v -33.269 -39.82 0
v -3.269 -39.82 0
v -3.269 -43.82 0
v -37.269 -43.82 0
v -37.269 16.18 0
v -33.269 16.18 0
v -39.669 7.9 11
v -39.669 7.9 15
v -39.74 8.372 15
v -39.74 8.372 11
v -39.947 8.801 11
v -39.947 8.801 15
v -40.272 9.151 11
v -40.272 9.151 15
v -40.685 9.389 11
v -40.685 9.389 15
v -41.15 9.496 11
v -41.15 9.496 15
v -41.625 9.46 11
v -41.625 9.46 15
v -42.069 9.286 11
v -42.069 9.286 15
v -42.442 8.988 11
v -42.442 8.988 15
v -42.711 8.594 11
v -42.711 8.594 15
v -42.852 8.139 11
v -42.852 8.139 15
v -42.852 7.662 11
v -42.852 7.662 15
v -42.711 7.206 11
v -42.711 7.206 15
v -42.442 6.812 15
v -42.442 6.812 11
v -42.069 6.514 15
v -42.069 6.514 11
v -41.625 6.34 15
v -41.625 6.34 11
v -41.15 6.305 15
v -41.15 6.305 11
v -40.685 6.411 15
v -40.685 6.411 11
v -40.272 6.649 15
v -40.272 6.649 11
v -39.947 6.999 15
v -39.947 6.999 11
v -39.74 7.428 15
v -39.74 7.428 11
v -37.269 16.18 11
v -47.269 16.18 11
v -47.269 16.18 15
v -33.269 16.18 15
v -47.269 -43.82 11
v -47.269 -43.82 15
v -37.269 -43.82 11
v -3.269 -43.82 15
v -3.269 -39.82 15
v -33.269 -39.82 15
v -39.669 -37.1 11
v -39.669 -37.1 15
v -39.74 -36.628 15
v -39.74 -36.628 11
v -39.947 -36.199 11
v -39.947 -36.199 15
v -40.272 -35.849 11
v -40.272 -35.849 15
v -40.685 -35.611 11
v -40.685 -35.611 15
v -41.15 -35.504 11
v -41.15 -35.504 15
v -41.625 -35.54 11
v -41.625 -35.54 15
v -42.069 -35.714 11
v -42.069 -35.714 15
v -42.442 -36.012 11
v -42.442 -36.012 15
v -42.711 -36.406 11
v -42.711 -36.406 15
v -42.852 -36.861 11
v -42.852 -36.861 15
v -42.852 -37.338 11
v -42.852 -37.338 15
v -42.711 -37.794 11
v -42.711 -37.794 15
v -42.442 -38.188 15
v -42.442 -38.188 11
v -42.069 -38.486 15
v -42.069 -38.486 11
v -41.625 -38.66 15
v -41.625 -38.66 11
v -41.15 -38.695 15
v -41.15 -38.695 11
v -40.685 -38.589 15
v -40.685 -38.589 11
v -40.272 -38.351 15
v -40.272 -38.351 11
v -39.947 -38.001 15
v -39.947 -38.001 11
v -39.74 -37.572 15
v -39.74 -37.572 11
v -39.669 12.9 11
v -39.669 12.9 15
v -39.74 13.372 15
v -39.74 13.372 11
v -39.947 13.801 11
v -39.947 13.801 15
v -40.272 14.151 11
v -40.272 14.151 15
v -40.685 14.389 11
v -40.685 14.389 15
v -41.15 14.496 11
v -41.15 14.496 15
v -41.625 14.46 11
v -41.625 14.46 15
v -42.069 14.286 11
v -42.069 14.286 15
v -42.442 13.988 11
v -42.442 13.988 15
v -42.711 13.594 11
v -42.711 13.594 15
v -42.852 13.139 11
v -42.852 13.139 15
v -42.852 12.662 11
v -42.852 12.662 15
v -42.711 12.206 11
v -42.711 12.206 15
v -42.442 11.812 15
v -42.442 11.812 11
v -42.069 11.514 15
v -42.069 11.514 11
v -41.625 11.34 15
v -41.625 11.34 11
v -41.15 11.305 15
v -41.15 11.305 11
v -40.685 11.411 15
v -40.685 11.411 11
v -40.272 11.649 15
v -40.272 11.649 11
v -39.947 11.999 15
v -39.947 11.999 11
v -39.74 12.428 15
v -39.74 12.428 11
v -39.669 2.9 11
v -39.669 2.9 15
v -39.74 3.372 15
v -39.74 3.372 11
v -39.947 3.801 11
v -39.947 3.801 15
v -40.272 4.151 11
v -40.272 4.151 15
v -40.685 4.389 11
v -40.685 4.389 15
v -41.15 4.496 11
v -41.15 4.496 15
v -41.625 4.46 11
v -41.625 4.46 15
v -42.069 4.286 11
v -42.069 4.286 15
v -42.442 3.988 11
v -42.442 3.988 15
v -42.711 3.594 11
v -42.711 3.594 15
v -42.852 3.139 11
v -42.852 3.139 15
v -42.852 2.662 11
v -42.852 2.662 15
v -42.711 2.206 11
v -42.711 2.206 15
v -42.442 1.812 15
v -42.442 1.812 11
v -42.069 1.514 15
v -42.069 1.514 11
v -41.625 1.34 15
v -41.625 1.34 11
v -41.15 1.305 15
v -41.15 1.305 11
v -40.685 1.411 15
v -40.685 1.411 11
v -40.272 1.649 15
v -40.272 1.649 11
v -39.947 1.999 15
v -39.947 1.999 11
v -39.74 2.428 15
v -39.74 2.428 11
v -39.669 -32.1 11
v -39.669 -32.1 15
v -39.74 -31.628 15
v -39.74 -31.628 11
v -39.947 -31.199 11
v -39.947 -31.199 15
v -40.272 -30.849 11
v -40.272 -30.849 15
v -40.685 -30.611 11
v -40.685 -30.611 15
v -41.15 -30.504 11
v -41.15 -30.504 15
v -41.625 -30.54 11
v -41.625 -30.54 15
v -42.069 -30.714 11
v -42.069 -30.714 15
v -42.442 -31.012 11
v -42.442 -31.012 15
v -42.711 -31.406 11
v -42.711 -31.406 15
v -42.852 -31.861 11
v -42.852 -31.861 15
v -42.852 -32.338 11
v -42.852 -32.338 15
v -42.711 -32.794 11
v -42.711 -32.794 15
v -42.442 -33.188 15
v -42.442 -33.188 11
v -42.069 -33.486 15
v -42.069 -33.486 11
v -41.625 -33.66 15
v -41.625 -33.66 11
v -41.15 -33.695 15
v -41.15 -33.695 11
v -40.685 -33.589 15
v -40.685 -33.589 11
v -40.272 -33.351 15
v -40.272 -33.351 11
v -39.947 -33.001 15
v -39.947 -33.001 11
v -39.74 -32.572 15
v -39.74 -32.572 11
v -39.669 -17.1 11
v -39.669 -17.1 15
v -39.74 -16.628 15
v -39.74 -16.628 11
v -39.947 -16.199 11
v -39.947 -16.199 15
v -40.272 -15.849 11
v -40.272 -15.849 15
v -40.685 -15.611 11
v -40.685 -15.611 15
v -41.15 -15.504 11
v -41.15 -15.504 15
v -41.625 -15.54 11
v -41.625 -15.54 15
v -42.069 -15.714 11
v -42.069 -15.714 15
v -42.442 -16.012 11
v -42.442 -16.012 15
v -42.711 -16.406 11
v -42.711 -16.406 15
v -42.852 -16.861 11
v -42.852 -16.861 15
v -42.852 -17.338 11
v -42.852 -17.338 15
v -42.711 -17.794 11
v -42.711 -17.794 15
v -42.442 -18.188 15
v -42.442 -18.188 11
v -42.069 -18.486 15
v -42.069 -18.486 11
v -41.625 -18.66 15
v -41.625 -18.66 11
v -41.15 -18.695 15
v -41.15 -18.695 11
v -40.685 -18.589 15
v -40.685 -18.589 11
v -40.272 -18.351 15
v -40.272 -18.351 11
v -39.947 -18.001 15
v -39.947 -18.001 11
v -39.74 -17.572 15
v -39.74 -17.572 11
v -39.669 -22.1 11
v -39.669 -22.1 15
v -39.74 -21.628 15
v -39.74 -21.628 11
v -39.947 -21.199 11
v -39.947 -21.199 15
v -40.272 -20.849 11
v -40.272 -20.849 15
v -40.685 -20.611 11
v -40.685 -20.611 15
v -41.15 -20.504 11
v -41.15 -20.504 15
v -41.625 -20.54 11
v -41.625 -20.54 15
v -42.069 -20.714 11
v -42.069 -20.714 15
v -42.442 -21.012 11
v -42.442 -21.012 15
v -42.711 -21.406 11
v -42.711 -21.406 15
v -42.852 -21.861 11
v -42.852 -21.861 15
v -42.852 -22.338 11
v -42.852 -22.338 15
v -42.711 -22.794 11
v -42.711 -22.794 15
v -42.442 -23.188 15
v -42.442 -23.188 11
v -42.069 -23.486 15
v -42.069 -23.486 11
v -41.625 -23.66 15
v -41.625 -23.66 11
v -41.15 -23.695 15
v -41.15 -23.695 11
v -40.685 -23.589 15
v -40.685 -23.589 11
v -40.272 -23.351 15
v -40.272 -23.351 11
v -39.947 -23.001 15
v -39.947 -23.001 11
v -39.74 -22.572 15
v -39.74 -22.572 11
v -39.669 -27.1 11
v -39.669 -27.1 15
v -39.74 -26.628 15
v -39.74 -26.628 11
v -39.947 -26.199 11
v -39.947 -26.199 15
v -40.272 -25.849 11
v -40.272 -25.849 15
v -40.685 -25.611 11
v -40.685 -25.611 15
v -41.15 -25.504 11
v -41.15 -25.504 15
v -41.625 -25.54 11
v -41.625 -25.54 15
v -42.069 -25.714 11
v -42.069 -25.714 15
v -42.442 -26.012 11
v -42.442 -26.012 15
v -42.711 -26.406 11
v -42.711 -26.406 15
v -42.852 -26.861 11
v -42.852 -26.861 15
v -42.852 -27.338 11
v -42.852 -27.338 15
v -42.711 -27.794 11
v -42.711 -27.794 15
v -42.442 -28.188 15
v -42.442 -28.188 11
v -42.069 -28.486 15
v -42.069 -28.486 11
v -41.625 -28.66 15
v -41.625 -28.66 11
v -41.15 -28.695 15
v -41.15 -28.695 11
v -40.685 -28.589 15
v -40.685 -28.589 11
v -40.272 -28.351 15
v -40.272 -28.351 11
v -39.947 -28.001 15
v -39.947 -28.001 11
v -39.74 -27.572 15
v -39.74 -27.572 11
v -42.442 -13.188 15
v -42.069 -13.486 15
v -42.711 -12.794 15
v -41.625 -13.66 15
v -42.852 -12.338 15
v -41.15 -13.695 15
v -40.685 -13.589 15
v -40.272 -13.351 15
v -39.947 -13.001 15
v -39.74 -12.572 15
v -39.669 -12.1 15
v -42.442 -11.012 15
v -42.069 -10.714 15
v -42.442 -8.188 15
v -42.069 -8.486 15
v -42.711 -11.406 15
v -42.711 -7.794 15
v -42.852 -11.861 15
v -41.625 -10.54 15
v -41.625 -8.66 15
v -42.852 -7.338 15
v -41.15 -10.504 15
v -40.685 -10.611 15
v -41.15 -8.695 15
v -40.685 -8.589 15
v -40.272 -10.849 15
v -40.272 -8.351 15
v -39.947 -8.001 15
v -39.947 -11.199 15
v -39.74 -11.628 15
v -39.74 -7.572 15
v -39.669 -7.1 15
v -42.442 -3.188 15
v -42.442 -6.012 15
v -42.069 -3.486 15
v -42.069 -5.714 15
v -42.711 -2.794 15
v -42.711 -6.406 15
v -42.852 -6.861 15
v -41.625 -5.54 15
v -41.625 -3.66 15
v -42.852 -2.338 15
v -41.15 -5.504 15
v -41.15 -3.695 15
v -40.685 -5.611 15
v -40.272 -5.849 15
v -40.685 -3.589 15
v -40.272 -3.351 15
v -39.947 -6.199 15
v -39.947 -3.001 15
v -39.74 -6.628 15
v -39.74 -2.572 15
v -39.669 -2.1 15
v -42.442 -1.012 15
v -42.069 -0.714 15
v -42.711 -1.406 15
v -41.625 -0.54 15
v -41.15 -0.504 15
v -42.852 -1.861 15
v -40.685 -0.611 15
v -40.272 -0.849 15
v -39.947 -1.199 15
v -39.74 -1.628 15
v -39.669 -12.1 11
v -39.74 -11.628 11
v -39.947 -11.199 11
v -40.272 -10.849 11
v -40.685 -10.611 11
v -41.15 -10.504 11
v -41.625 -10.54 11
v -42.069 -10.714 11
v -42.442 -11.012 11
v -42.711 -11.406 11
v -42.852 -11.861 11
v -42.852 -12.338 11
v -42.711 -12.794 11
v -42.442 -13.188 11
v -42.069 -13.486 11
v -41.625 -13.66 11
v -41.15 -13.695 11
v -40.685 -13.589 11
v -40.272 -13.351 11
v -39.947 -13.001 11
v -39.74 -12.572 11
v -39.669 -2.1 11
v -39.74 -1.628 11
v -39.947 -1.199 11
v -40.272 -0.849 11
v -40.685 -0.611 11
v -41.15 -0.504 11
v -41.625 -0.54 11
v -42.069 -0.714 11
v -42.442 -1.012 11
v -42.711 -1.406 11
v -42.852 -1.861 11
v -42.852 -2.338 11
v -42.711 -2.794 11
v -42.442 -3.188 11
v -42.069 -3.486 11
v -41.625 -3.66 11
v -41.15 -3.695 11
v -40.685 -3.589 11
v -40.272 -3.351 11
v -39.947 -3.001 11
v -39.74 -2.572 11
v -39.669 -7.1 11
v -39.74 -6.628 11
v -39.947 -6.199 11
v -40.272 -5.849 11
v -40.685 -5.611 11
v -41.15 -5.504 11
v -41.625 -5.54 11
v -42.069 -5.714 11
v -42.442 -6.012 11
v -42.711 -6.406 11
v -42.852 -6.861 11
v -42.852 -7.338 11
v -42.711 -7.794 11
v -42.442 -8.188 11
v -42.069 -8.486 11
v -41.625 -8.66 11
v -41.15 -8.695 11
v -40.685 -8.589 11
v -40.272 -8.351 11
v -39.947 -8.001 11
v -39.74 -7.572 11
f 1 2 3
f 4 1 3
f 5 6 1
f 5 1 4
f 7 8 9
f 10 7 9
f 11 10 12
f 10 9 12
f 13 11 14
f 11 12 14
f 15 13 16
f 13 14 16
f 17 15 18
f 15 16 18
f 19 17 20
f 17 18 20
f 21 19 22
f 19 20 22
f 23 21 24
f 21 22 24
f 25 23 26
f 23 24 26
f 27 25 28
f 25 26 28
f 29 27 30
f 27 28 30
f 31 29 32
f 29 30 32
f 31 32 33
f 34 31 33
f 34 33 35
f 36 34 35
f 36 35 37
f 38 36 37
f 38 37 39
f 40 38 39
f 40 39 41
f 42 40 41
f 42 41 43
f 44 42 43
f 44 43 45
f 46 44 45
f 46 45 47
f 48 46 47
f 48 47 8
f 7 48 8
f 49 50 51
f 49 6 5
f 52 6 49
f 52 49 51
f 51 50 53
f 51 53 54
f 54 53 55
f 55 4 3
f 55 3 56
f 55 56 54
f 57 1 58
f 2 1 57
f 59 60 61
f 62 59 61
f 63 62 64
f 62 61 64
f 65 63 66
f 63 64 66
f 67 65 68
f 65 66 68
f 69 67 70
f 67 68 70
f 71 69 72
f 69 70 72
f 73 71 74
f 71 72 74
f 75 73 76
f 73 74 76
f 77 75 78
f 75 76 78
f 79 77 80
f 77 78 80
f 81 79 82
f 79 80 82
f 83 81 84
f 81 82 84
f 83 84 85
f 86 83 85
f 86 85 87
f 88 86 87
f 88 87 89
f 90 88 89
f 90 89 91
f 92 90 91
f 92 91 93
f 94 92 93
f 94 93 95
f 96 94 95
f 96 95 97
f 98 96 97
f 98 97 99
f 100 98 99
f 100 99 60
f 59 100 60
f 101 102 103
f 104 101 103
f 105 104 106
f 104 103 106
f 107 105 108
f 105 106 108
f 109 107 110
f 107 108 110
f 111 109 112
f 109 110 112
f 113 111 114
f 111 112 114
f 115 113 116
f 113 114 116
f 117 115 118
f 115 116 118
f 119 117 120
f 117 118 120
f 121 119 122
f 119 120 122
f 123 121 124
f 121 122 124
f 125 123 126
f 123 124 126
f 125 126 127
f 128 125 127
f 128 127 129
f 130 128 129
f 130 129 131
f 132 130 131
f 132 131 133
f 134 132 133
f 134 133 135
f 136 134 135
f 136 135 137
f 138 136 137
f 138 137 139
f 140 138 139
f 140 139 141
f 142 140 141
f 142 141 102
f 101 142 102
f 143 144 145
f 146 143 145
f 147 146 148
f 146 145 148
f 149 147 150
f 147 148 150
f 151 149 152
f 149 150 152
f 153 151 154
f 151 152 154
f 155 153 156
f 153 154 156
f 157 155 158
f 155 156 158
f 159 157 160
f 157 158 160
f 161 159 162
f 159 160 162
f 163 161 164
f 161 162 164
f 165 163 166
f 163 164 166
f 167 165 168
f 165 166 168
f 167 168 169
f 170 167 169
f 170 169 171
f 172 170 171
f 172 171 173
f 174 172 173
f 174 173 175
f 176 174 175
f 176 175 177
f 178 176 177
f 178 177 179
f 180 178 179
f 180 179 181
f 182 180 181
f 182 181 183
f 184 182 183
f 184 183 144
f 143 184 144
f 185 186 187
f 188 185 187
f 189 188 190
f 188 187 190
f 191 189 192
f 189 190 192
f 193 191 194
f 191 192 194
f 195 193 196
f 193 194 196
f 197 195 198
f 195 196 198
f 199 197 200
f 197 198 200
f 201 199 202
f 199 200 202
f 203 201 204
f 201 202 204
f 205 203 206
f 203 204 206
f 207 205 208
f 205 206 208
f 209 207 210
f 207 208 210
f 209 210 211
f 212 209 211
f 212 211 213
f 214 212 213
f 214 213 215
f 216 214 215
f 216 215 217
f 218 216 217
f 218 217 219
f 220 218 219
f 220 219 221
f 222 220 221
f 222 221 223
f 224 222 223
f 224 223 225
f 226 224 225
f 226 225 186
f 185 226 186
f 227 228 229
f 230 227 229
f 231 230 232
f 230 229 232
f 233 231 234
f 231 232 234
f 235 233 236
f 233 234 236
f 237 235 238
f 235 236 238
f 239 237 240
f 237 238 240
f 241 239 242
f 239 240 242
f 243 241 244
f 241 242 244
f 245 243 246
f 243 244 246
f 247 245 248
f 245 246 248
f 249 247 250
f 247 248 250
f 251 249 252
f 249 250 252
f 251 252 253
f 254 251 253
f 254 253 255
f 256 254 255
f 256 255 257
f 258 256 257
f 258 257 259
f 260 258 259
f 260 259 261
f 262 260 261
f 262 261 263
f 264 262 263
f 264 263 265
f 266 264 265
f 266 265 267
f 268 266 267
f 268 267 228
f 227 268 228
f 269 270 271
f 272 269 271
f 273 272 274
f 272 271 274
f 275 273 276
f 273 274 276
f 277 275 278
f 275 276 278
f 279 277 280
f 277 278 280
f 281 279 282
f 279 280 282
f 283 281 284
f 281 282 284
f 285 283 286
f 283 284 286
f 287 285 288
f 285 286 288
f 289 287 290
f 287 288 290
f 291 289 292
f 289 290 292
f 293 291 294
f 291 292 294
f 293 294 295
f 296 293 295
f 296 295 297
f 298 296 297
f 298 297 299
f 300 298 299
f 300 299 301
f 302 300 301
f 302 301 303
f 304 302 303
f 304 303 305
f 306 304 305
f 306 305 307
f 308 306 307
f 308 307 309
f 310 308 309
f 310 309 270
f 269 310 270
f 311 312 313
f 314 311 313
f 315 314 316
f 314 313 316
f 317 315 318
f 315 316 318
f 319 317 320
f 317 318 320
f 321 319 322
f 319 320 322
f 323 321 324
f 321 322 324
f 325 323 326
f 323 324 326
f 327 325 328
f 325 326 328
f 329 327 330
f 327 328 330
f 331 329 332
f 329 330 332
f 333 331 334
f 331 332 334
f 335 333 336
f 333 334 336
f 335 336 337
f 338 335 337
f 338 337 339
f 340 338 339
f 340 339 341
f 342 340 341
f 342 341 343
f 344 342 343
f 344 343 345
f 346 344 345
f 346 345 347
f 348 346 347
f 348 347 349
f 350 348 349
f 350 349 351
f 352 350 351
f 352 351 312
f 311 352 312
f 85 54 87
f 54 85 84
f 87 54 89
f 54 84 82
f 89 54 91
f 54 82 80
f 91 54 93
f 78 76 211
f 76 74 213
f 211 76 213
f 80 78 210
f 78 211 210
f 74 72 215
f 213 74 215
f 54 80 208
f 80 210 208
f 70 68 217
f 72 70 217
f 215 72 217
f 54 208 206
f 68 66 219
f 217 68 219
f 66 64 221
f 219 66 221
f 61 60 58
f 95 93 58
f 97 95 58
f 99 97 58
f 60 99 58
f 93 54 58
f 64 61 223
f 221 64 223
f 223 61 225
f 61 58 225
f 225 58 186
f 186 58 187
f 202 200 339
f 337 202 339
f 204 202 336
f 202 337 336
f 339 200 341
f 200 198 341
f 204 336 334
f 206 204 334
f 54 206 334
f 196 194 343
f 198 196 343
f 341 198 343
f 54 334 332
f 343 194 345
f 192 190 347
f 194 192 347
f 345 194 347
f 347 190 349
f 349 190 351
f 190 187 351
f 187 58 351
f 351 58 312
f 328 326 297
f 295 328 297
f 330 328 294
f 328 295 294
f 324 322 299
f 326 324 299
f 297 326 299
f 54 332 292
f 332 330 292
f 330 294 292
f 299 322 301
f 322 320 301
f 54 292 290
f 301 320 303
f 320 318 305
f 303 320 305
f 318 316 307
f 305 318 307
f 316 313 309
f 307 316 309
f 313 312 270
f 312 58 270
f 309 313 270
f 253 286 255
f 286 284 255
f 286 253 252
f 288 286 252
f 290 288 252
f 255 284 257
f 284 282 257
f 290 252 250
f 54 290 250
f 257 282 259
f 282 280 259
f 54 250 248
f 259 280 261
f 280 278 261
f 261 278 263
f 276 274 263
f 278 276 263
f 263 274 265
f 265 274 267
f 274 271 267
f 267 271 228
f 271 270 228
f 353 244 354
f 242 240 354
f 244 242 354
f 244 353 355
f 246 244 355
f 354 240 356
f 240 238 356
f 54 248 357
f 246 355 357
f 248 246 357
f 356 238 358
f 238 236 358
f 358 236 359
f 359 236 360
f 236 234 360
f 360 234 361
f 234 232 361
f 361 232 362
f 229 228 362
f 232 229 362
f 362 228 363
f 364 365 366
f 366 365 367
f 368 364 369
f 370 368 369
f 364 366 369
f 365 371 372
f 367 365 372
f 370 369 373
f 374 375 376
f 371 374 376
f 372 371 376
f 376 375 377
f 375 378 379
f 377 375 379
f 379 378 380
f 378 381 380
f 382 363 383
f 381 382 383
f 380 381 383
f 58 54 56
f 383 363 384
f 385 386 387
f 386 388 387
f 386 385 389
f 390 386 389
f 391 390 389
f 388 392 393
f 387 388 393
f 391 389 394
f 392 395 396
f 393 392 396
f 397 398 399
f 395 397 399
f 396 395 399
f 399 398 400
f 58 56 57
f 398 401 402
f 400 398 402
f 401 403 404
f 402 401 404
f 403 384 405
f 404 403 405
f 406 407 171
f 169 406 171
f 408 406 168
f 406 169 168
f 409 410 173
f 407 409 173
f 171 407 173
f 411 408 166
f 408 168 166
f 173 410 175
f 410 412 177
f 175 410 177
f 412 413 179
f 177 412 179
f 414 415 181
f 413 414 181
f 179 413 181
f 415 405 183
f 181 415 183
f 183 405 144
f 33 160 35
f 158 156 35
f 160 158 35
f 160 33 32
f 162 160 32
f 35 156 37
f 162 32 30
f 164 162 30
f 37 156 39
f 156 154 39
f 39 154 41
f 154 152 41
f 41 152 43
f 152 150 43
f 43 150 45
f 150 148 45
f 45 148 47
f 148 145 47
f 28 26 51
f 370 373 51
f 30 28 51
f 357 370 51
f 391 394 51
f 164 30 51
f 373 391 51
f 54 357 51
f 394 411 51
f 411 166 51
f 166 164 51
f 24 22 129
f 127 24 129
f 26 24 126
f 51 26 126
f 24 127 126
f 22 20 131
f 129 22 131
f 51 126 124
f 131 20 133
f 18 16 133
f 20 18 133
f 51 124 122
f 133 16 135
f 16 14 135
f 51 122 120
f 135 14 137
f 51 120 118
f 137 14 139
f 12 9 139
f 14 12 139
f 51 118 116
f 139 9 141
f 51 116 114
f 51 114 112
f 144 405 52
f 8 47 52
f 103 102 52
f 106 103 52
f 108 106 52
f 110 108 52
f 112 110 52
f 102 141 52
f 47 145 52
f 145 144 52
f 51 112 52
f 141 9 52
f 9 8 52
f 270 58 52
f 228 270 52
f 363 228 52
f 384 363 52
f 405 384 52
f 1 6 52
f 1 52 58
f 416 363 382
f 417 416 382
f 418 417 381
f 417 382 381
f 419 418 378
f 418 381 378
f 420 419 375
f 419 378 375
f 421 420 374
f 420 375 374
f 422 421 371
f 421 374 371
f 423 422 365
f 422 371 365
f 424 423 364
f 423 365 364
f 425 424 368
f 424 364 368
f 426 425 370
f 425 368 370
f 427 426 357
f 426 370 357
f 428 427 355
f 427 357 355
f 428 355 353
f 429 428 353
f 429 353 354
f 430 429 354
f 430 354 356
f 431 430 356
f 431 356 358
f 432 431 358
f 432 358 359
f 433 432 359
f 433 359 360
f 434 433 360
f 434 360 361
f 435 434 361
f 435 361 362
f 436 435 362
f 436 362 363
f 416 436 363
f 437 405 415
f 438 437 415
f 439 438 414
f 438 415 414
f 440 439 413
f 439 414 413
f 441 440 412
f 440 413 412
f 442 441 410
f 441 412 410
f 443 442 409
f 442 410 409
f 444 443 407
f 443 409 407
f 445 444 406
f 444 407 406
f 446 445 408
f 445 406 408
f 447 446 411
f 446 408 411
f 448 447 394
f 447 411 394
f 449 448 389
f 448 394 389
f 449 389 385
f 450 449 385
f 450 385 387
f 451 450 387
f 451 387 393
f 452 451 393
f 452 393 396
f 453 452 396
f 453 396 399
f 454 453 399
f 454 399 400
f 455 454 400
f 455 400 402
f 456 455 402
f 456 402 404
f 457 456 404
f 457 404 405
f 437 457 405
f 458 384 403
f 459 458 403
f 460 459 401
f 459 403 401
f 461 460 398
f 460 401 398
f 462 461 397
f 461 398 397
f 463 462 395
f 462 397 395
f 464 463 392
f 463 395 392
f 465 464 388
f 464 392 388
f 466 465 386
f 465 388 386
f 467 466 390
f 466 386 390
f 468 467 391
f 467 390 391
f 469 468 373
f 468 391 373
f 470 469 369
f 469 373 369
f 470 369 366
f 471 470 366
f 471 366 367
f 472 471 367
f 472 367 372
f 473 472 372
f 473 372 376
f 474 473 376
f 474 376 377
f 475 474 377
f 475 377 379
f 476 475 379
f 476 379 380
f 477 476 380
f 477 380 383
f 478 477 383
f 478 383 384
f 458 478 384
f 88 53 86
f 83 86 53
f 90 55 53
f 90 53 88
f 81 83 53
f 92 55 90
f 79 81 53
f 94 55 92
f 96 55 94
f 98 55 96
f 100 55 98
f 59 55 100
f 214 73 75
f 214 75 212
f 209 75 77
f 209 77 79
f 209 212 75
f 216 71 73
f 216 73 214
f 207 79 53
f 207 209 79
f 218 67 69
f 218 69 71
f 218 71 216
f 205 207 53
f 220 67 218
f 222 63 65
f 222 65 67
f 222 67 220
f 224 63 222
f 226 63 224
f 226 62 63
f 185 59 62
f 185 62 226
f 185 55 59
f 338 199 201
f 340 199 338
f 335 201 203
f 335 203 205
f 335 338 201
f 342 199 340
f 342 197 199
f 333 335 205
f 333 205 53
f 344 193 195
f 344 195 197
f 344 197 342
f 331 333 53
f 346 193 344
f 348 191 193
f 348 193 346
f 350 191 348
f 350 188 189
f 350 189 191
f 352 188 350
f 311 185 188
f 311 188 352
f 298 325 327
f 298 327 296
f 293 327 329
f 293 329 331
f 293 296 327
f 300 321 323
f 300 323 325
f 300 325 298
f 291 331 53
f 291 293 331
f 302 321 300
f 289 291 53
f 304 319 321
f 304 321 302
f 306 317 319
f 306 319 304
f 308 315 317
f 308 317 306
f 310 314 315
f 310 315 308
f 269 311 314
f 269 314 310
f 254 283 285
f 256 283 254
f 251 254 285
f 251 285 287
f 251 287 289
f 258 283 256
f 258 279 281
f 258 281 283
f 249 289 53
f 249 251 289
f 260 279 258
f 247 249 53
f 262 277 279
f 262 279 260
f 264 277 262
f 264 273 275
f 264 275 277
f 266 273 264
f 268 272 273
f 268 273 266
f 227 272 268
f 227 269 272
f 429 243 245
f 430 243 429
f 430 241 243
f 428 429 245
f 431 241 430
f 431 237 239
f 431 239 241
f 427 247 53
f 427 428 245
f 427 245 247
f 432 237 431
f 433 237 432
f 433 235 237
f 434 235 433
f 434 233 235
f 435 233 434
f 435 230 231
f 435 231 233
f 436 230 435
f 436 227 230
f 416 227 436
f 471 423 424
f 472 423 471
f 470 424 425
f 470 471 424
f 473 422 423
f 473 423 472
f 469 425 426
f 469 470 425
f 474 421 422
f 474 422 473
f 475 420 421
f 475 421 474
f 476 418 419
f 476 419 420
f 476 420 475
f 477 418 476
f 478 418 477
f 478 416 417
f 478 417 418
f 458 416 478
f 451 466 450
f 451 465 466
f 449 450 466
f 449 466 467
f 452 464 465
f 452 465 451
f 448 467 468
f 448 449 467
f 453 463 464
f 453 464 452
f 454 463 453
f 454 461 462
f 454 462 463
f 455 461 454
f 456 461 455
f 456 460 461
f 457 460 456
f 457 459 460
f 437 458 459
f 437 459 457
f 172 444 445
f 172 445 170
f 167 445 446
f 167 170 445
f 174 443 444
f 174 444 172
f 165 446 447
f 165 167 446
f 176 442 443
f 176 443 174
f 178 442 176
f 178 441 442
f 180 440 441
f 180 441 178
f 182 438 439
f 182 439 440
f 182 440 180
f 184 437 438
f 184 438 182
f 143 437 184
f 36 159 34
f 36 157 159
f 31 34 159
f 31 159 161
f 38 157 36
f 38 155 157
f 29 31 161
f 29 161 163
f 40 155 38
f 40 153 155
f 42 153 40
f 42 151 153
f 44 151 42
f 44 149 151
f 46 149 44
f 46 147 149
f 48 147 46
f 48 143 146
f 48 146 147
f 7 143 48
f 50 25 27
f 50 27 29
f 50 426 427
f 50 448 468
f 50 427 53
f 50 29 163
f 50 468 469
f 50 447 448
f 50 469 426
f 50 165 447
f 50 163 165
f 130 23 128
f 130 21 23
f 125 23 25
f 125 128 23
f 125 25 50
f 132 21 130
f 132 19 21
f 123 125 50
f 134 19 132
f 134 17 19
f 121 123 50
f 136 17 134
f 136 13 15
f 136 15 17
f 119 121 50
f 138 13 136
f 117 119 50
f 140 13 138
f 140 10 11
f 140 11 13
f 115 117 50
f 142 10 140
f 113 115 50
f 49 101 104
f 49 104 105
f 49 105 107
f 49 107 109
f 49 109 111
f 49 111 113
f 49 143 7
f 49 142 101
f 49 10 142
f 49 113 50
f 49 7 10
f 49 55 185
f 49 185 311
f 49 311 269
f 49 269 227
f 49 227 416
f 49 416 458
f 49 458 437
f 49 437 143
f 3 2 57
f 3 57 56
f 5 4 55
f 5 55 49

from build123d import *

# Parameters (mm, degrees)
EXTRUDE_1_DEPTH     = 15
SKETCH_2_W          = 4
SKETCH_2_H          = 60
EXTRUDE_2_DEPTH     = 10
SKETCH_3_R          = 1.6
CUT_EXTRUDE_1_DEPTH = 6


with BuildPart() as part:
    # ｽｹｯﾁ1 → ﾎﾞｽ - 押し出し1 (new body)
    with BuildSketch(Plane.XY):
        Polygon((-37.26940162, 16.179775281), (-33.26940162, 16.179775281), (-33.26940162, -39.820224719), (-3.26940162, -39.820224719), (-3.26940162, -43.820224719), (-37.26940162, -43.820224719), align=None)
    extrude(amount=EXTRUDE_1_DEPTH)

    # ｽｹｯﾁ2 → ﾎﾞｽ - 押し出し2 (add)
    with BuildSketch(Plane.ZY.offset(37.26940162)):
        with Locations((13, -13.820224719)):
            Rectangle(SKETCH_2_W, SKETCH_2_H)
    extrude(amount=EXTRUDE_2_DEPTH)

    # ｽｹｯﾁ3 → ｶｯﾄ - 押し出し1 (cut)
    with BuildSketch(Plane.XY.offset(15)):
        with Locations((-41.26940162, 7.900067142)):
            Circle(SKETCH_3_R)
        with Locations((-41.26940162, 2.900067142)):
            Circle(SKETCH_3_R)
        with Locations((-41.26940162, -2.099932858)):
            Circle(SKETCH_3_R)
        with Locations((-41.26940162, -7.099932858)):
            Circle(SKETCH_3_R)
        with Locations((-41.26940162, -12.099932858)):
            Circle(SKETCH_3_R)
        with Locations((-41.26940162, -17.099932858)):
            Circle(SKETCH_3_R)
        with Locations((-41.26940162, -22.099932858)):
            Circle(SKETCH_3_R)
        with Locations((-41.26940162, -27.099932858)):
            Circle(SKETCH_3_R)
        with Locations((-41.26940162, -32.099932858)):
            Circle(SKETCH_3_R)
        with Locations((-41.26940162, -37.099932858)):
            Circle(SKETCH_3_R)
        with Locations((-41.26940162, 12.900067142)):
            Circle(SKETCH_3_R)
    extrude(amount=-CUT_EXTRUDE_1_DEPTH, mode=Mode.SUBTRACT)


solid = part.part
